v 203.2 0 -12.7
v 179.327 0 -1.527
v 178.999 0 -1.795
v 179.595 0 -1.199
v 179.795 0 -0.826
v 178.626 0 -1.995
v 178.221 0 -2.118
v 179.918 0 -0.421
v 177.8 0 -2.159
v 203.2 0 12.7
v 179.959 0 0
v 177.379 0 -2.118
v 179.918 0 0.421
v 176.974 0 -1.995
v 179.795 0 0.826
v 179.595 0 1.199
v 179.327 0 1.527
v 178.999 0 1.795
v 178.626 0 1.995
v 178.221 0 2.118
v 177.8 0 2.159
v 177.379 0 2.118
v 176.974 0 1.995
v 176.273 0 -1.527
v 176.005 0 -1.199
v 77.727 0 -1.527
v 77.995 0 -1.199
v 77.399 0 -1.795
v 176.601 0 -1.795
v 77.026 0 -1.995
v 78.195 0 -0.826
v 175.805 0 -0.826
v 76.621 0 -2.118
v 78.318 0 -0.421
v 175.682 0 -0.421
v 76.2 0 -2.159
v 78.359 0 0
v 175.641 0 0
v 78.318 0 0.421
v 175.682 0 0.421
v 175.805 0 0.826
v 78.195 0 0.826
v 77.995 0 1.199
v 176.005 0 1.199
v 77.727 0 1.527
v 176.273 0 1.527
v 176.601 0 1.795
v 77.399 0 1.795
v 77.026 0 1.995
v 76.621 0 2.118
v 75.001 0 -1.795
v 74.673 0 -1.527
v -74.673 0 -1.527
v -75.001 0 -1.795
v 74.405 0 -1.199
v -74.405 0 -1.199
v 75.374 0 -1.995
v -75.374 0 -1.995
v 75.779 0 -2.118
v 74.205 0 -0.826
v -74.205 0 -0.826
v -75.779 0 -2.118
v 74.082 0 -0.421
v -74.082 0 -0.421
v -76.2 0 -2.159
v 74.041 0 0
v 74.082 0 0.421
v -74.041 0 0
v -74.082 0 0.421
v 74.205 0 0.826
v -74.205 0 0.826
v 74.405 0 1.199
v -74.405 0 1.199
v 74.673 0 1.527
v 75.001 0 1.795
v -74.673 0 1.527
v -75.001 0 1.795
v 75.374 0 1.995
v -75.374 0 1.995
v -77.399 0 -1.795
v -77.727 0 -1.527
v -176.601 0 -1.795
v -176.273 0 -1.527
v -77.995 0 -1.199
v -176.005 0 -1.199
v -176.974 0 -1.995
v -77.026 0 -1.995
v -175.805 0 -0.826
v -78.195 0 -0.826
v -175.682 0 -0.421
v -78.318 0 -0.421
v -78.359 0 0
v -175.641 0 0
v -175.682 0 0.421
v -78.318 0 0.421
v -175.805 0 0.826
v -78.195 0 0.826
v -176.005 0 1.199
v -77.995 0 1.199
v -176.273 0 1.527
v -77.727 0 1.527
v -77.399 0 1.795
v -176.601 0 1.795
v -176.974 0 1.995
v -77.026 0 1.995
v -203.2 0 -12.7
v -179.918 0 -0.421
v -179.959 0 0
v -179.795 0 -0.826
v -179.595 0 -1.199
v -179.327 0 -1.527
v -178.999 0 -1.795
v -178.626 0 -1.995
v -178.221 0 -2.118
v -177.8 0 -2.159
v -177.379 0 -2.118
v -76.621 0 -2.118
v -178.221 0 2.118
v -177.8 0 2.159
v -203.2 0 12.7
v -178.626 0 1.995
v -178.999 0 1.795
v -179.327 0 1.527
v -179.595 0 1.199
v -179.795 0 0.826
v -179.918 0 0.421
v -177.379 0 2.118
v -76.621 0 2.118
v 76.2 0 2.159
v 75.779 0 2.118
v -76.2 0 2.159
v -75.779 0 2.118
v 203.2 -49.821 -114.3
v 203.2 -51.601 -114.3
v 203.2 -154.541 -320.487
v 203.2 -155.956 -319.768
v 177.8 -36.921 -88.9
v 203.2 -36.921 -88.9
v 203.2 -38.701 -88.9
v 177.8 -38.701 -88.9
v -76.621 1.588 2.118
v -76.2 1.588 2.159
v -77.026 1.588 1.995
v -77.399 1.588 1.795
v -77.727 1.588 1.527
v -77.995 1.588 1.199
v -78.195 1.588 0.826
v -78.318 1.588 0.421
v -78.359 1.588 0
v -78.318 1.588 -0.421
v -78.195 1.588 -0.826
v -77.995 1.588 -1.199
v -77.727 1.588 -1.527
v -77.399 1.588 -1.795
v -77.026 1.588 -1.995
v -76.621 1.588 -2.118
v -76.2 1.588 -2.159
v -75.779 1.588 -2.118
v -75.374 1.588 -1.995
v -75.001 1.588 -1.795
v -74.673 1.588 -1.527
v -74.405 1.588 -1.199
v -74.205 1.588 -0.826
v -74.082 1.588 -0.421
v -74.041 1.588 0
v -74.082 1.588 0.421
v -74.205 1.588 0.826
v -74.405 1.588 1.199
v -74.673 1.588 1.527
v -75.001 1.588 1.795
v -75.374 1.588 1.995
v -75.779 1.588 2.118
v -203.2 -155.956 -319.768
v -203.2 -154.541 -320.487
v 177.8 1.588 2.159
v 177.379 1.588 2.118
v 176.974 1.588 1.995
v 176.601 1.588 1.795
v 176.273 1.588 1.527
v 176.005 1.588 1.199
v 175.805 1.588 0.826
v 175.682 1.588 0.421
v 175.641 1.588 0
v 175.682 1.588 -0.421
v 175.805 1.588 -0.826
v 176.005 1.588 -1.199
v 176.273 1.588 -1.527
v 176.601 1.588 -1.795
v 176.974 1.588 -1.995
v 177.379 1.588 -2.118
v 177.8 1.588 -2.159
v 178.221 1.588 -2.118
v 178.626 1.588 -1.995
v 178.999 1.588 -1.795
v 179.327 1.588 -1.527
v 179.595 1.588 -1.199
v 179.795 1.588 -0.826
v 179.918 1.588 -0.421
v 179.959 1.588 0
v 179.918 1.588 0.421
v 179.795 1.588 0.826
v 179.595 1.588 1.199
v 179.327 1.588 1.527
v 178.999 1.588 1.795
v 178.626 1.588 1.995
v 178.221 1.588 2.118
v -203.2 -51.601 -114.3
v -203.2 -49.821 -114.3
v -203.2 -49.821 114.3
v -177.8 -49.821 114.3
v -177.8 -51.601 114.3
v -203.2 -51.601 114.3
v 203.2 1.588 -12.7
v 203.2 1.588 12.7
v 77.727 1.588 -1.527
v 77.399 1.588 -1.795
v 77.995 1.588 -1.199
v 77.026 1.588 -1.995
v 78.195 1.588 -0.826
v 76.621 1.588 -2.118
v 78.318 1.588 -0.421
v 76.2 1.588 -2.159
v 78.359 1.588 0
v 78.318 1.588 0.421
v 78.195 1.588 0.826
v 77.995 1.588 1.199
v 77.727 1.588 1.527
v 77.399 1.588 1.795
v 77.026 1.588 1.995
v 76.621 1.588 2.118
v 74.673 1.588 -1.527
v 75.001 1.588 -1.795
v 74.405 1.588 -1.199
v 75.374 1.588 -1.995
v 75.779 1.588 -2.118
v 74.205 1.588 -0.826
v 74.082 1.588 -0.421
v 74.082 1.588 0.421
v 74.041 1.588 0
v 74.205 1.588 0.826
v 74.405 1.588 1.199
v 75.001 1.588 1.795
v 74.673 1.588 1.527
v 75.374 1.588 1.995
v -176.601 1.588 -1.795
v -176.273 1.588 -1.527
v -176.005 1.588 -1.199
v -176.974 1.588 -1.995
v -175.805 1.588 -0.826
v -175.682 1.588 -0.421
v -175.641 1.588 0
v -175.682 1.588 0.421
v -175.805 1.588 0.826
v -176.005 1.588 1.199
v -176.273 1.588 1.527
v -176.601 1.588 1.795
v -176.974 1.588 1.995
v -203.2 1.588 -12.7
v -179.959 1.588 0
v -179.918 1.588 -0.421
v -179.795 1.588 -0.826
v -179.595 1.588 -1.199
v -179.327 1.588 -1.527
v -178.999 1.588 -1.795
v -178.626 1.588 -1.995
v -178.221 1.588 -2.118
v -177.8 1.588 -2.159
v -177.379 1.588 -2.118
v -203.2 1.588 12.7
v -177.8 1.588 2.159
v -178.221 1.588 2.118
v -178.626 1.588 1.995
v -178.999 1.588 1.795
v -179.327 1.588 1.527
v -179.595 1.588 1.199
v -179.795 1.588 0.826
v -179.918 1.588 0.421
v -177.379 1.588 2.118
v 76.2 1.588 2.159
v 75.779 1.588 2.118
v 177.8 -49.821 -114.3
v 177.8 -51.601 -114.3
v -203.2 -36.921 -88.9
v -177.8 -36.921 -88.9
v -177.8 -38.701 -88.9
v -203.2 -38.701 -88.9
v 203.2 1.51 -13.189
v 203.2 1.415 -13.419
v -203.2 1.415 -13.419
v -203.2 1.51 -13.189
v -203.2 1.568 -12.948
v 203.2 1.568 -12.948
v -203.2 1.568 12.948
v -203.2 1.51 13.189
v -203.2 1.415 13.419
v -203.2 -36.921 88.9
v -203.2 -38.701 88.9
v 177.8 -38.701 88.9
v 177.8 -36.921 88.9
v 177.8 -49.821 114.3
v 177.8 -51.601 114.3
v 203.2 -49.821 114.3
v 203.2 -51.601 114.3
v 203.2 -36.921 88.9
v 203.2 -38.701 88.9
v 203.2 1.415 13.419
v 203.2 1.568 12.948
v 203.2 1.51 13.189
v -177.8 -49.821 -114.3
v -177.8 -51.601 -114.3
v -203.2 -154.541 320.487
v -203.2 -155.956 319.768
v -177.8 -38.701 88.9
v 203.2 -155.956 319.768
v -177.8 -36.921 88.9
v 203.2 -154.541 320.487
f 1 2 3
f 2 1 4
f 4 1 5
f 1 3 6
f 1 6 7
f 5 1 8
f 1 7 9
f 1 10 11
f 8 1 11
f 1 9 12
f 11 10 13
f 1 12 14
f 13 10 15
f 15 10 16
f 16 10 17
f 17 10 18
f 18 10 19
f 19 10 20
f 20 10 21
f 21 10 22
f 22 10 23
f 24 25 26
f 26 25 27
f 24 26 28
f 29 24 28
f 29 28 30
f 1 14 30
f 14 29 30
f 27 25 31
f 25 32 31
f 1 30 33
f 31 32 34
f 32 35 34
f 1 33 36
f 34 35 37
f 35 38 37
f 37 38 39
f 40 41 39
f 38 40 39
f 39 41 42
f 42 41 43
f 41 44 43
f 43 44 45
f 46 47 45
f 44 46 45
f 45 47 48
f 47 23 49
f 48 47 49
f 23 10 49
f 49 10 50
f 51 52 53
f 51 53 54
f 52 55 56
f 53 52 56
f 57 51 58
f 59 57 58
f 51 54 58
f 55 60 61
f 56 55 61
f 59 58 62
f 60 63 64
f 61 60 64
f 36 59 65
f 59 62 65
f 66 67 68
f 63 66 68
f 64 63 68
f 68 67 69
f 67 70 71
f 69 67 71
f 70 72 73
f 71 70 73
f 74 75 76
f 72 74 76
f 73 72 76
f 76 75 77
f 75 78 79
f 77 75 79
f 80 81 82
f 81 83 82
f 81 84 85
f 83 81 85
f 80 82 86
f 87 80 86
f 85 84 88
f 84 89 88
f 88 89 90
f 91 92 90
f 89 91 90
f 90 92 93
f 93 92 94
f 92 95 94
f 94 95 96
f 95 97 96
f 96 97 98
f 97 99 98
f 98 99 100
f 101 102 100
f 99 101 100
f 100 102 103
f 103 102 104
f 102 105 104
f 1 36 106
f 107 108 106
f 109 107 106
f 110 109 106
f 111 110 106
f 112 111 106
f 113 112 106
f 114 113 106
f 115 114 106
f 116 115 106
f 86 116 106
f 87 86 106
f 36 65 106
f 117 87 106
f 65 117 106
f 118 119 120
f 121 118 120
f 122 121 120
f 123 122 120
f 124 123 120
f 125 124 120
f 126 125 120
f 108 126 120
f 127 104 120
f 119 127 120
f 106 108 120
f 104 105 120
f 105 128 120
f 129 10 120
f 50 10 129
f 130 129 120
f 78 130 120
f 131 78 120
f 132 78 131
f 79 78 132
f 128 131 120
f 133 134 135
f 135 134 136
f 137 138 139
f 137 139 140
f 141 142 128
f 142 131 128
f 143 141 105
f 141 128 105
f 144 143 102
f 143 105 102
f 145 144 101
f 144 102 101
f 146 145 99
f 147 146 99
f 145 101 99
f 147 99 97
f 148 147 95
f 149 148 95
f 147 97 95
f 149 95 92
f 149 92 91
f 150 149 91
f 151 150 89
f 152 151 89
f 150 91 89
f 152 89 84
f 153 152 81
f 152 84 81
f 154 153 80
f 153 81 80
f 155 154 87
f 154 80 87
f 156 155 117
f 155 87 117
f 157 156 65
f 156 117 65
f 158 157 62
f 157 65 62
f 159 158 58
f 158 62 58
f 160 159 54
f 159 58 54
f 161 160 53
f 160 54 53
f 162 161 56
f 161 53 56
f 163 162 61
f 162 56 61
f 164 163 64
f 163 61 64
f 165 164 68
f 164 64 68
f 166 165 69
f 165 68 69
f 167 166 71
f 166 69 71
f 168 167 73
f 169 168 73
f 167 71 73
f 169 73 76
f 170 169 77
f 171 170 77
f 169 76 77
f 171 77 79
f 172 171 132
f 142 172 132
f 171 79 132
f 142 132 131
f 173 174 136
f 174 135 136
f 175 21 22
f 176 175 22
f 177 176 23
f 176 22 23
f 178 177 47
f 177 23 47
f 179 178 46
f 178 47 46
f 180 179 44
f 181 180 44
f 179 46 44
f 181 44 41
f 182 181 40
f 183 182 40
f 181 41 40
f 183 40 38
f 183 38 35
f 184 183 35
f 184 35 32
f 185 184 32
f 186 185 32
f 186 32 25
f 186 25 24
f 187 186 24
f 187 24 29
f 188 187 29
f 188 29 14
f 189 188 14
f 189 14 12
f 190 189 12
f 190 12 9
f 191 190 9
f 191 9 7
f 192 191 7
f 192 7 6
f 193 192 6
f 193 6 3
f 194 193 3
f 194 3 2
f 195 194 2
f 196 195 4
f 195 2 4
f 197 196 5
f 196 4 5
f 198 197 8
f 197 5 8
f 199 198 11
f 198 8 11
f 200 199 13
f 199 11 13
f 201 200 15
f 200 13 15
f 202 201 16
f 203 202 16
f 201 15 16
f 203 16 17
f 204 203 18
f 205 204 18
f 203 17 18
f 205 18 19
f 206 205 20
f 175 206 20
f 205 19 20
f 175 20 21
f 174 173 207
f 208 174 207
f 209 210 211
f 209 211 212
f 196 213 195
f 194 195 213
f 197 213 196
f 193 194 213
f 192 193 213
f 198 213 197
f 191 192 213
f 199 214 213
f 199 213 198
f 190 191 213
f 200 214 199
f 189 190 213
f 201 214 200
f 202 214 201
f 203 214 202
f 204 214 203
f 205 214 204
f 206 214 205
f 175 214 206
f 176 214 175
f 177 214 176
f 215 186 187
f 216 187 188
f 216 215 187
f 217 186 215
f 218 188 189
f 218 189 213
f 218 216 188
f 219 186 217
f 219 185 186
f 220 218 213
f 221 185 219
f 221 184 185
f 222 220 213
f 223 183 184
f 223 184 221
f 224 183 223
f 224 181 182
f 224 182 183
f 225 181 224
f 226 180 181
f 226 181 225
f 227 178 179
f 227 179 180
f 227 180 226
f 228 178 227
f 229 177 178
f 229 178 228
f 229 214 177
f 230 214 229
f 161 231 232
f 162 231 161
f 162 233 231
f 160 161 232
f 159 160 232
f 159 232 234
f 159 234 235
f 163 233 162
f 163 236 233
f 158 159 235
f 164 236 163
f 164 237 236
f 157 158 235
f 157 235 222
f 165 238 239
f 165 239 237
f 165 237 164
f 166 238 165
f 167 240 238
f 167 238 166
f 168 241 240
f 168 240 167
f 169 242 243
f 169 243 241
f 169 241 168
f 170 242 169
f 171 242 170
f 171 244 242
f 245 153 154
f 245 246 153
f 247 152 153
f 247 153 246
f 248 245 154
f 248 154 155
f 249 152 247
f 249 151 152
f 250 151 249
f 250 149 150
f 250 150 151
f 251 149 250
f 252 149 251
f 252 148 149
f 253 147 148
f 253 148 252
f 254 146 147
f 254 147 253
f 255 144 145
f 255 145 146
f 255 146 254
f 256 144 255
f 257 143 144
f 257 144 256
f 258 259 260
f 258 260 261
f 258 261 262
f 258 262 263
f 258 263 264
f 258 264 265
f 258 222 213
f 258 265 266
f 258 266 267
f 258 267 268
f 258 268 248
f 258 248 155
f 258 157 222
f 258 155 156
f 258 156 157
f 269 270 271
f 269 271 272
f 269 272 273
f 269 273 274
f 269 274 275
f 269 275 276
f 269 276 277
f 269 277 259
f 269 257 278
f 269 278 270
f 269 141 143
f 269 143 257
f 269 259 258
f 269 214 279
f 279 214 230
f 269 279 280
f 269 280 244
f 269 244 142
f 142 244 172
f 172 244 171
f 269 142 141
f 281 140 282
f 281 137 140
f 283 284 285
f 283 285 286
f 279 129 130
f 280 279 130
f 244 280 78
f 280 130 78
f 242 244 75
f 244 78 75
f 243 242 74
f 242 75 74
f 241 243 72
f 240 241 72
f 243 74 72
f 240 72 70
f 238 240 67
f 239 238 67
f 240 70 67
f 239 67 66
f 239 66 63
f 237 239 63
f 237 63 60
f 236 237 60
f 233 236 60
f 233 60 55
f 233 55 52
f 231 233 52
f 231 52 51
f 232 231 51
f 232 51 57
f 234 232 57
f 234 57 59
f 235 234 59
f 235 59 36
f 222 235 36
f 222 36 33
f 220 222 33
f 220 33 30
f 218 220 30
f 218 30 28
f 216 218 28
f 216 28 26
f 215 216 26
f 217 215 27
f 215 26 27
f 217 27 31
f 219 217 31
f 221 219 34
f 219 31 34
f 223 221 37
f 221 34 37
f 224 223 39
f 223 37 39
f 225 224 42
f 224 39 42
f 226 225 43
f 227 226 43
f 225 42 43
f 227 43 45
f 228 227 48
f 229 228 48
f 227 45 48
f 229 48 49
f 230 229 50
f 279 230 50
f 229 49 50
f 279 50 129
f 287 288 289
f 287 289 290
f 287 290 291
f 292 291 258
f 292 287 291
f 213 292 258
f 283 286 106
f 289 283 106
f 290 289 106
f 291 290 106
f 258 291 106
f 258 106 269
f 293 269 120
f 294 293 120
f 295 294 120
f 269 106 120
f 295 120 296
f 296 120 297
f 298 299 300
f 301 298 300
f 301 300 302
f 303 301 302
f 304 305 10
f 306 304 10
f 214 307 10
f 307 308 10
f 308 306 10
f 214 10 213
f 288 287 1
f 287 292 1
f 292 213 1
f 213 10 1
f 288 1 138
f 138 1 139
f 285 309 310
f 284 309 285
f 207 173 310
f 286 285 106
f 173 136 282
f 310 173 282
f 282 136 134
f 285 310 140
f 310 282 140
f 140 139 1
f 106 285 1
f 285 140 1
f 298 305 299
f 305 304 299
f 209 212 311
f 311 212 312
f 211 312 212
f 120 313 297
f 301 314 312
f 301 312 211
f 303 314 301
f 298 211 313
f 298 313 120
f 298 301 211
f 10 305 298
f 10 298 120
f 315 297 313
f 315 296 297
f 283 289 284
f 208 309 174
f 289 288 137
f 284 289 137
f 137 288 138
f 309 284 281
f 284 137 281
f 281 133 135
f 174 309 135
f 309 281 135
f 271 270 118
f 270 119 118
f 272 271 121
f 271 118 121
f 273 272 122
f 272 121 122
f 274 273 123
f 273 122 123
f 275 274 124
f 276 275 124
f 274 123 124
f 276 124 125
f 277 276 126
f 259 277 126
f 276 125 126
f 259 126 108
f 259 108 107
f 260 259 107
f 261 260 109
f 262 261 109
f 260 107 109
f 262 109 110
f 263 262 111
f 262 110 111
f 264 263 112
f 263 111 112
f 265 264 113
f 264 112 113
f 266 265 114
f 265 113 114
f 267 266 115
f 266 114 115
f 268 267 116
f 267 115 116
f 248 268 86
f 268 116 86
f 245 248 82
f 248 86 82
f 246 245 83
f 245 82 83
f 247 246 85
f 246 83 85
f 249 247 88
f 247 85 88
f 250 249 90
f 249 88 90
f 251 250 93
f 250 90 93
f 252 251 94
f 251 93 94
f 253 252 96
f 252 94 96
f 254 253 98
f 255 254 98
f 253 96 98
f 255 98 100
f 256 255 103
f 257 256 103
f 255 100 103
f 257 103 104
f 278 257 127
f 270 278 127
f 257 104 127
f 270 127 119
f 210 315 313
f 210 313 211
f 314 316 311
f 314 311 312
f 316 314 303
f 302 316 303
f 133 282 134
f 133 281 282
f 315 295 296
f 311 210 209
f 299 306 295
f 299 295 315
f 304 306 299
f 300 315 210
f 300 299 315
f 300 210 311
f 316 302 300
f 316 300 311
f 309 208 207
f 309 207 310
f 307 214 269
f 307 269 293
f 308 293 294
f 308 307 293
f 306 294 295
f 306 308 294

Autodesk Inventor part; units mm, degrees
ref_plane "YZ Plane" through (0, 0, 0) normal (1, 0, 0) x (0, 1, 0)
ref_plane "XZ Plane" through (0, 0, 0) normal (0, 1, 0) x (-1, 0, 0)
ref_plane "XY Plane" through (0, 0, 0) normal (0, 0, 1) x (1, 0, 0)
sketch "Sketch1" plane through (0, 0, 0) normal (0, 1, 0) x (-1, 0, 0)
  line L0 (203.2, 12.7) -> (-203.2, 12.7)
  line L1 (-203.2, 12.7) -> (-203.2, -12.7)
  line L2 (-203.2, -12.7) -> (203.2, -12.7)
  line L3 (203.2, -12.7) -> (203.2, 12.7)
  line L4 (203.2, 12.7) -> (-203.2, -12.7) construction
  line L5 (-203.2, 12.7) -> (203.2, -12.7) construction
  point P0 (0, 0)
  dimension "d0" = 406.4
  dimension "d1" = 25.4
extrude "Extrusion1" add sketch "Sketch1" along normal blind 1.5875
sketch "Sketch2" plane through (0, 1.5875, 0) normal (0, 1, 0) x (1, 0, 0)
  line L0 (-203.2, 12.7) -> (-203.2, -12.7) projected
  line L1 (203.2, -12.7) -> (203.2, 12.7) projected
  point P0 (0, 0)
  point P1 (-177.8, 0)
  point P2 (-152.4, 0)
  point P3 (177.8, 0)
  point P4 (152.4, 0)
  point P5 (76.2, 0)
  point P6 (50.8, 0)
  point P7 (-76.2, 0)
  point P8 (-50.8, 0)
  dimension "d4" = 25.4
  dimension "d5" = 25.4
  dimension "d6" = 25.4
  dimension "d7" = 25.4
  dimension "d8" = 25.4
  dimension "d9" = 25.4
  dimension "d10" = 76.2
  dimension "d11" = 76.2
hole "Hole1" at (-177.8, 1.5875, 0) at (177.8, 1.5875, 0) at (76.2, 1.5875, 0) at (-76.2, 1.5875, 0) direction (0, -1, 0) diameter 4.318 end through all
sketch "Sketch3" plane through (203.2, 0, 12.7) normal (1, 0, 0) x (0, 0, -1)
  line L0 (0, 0) -> (25.4, 0) projected
  line L1 (0, 0) -> (-0.7189, 1.4154)
  line L2 (-0.7189, 1.4154) -> (-307.7868, -154.5406)
  line L3 (-307.7868, -154.5406) -> (-307.068, -155.956)
  line L4 (-307.068, -155.956) -> (0, 0)
  line L5 (25.4, 0) -> (26.1189, 1.4154)
  line L6 (26.1189, 1.4154) -> (333.1868, -154.5406)
  line L7 (333.1868, -154.5406) -> (332.468, -155.956)
  line L8 (332.468, -155.956) -> (25.4, 0)
  line L9 (0, 0) -> (0, 1.5875) projected
  line L10 (25.4, 0) -> (25.4, 1.5875) projected
  line L11 (0, 1.5875) -> (25.4, 1.5875) projected
  arc A0 (0, 1.5875) -> (-0.7189, 1.4154) centre (0, 0) ccw
  arc A1 (26.1189, 1.4154) -> (25.4, 1.5875) centre (25.4, 0) ccw
  line L12 (-204.5453, -103.886) -> (-179.1453, -103.886)
  line L13 (-357.0791, -181.356) -> (382.4791, -181.356)
  point P0 (12.7, 0)
  point P1 (12.7, -181.356)
  point P2 (12.7, 0)
  dimension "d19" = 25.4
  dimension "d20" = 103.886
  dimension "d21" = 207.0877
  dimension "d22" = 181.356
  dimension "d23" = 25.4
extrude "Extrusion2" add sketch "Sketch3" against normal up to surface (406.4 mm away) contours L4 L3 L2 L1 | L1 A0 L9 | L10 A1 L5 | L5 L6 L7 L8
sketch "Sketch4" plane through (0, 1.5875, 0) normal (0, 1, 0) x (1, 0, 0)
  line L0 (203.2, -319.768) -> (203.2, -12.7) projected
  line L1 (203.2, -88.9) -> (177.8, -88.9)
  line L2 (177.8, -88.9) -> (177.8, -114.3)
  line L3 (177.8, -114.3) -> (203.2, -114.3)
  line L4 (203.2, -114.3) -> (203.2, -88.9)
  line L5 (203.2, 12.7) -> (203.2, 319.768) projected
  line L6 (203.2, 88.9) -> (177.8, 88.9)
  line L7 (177.8, 88.9) -> (177.8, 114.3)
  line L8 (177.8, 114.3) -> (203.2, 114.3)
  line L9 (203.2, 114.3) -> (203.2, 88.9)
  line L10 (-203.2, 12.7) -> (-203.2, 319.768) projected
  line L11 (-203.2, 114.3) -> (-177.8, 114.3)
  line L12 (-177.8, 114.3) -> (-177.8, 88.9)
  line L13 (-177.8, 88.9) -> (-203.2, 88.9)
  line L14 (-203.2, 88.9) -> (-203.2, 114.3)
  line L15 (-203.2, -319.768) -> (-203.2, -12.7) projected
  line L16 (-203.2, -88.9) -> (-177.8, -88.9)
  line L17 (-177.8, -88.9) -> (-177.8, -114.3)
  line L18 (-177.8, -114.3) -> (-203.2, -114.3)
  line L19 (-203.2, -114.3) -> (-203.2, -88.9)
  line L20 (177.8, -88.9) -> (177.8, 88.9) construction
  line L21 (-177.8, 88.9) -> (-177.8, -88.9) construction
  point P0 (0, 0)
  point P1 (-177.8, 0)
  point P2 (177.8, 0)
  point P3 (177.8, -101.6)
  dimension "d26" = 25.4
  dimension "d29" = 101.6
extrude "Extrusion3" cut sketch "Sketch4" against normal through all
properties part number "Ramp Using 1__16 Gray Tinted Polycarbonate Sheet (36 x 72) (217-6627)" material "Polycarbonate, Clear"
